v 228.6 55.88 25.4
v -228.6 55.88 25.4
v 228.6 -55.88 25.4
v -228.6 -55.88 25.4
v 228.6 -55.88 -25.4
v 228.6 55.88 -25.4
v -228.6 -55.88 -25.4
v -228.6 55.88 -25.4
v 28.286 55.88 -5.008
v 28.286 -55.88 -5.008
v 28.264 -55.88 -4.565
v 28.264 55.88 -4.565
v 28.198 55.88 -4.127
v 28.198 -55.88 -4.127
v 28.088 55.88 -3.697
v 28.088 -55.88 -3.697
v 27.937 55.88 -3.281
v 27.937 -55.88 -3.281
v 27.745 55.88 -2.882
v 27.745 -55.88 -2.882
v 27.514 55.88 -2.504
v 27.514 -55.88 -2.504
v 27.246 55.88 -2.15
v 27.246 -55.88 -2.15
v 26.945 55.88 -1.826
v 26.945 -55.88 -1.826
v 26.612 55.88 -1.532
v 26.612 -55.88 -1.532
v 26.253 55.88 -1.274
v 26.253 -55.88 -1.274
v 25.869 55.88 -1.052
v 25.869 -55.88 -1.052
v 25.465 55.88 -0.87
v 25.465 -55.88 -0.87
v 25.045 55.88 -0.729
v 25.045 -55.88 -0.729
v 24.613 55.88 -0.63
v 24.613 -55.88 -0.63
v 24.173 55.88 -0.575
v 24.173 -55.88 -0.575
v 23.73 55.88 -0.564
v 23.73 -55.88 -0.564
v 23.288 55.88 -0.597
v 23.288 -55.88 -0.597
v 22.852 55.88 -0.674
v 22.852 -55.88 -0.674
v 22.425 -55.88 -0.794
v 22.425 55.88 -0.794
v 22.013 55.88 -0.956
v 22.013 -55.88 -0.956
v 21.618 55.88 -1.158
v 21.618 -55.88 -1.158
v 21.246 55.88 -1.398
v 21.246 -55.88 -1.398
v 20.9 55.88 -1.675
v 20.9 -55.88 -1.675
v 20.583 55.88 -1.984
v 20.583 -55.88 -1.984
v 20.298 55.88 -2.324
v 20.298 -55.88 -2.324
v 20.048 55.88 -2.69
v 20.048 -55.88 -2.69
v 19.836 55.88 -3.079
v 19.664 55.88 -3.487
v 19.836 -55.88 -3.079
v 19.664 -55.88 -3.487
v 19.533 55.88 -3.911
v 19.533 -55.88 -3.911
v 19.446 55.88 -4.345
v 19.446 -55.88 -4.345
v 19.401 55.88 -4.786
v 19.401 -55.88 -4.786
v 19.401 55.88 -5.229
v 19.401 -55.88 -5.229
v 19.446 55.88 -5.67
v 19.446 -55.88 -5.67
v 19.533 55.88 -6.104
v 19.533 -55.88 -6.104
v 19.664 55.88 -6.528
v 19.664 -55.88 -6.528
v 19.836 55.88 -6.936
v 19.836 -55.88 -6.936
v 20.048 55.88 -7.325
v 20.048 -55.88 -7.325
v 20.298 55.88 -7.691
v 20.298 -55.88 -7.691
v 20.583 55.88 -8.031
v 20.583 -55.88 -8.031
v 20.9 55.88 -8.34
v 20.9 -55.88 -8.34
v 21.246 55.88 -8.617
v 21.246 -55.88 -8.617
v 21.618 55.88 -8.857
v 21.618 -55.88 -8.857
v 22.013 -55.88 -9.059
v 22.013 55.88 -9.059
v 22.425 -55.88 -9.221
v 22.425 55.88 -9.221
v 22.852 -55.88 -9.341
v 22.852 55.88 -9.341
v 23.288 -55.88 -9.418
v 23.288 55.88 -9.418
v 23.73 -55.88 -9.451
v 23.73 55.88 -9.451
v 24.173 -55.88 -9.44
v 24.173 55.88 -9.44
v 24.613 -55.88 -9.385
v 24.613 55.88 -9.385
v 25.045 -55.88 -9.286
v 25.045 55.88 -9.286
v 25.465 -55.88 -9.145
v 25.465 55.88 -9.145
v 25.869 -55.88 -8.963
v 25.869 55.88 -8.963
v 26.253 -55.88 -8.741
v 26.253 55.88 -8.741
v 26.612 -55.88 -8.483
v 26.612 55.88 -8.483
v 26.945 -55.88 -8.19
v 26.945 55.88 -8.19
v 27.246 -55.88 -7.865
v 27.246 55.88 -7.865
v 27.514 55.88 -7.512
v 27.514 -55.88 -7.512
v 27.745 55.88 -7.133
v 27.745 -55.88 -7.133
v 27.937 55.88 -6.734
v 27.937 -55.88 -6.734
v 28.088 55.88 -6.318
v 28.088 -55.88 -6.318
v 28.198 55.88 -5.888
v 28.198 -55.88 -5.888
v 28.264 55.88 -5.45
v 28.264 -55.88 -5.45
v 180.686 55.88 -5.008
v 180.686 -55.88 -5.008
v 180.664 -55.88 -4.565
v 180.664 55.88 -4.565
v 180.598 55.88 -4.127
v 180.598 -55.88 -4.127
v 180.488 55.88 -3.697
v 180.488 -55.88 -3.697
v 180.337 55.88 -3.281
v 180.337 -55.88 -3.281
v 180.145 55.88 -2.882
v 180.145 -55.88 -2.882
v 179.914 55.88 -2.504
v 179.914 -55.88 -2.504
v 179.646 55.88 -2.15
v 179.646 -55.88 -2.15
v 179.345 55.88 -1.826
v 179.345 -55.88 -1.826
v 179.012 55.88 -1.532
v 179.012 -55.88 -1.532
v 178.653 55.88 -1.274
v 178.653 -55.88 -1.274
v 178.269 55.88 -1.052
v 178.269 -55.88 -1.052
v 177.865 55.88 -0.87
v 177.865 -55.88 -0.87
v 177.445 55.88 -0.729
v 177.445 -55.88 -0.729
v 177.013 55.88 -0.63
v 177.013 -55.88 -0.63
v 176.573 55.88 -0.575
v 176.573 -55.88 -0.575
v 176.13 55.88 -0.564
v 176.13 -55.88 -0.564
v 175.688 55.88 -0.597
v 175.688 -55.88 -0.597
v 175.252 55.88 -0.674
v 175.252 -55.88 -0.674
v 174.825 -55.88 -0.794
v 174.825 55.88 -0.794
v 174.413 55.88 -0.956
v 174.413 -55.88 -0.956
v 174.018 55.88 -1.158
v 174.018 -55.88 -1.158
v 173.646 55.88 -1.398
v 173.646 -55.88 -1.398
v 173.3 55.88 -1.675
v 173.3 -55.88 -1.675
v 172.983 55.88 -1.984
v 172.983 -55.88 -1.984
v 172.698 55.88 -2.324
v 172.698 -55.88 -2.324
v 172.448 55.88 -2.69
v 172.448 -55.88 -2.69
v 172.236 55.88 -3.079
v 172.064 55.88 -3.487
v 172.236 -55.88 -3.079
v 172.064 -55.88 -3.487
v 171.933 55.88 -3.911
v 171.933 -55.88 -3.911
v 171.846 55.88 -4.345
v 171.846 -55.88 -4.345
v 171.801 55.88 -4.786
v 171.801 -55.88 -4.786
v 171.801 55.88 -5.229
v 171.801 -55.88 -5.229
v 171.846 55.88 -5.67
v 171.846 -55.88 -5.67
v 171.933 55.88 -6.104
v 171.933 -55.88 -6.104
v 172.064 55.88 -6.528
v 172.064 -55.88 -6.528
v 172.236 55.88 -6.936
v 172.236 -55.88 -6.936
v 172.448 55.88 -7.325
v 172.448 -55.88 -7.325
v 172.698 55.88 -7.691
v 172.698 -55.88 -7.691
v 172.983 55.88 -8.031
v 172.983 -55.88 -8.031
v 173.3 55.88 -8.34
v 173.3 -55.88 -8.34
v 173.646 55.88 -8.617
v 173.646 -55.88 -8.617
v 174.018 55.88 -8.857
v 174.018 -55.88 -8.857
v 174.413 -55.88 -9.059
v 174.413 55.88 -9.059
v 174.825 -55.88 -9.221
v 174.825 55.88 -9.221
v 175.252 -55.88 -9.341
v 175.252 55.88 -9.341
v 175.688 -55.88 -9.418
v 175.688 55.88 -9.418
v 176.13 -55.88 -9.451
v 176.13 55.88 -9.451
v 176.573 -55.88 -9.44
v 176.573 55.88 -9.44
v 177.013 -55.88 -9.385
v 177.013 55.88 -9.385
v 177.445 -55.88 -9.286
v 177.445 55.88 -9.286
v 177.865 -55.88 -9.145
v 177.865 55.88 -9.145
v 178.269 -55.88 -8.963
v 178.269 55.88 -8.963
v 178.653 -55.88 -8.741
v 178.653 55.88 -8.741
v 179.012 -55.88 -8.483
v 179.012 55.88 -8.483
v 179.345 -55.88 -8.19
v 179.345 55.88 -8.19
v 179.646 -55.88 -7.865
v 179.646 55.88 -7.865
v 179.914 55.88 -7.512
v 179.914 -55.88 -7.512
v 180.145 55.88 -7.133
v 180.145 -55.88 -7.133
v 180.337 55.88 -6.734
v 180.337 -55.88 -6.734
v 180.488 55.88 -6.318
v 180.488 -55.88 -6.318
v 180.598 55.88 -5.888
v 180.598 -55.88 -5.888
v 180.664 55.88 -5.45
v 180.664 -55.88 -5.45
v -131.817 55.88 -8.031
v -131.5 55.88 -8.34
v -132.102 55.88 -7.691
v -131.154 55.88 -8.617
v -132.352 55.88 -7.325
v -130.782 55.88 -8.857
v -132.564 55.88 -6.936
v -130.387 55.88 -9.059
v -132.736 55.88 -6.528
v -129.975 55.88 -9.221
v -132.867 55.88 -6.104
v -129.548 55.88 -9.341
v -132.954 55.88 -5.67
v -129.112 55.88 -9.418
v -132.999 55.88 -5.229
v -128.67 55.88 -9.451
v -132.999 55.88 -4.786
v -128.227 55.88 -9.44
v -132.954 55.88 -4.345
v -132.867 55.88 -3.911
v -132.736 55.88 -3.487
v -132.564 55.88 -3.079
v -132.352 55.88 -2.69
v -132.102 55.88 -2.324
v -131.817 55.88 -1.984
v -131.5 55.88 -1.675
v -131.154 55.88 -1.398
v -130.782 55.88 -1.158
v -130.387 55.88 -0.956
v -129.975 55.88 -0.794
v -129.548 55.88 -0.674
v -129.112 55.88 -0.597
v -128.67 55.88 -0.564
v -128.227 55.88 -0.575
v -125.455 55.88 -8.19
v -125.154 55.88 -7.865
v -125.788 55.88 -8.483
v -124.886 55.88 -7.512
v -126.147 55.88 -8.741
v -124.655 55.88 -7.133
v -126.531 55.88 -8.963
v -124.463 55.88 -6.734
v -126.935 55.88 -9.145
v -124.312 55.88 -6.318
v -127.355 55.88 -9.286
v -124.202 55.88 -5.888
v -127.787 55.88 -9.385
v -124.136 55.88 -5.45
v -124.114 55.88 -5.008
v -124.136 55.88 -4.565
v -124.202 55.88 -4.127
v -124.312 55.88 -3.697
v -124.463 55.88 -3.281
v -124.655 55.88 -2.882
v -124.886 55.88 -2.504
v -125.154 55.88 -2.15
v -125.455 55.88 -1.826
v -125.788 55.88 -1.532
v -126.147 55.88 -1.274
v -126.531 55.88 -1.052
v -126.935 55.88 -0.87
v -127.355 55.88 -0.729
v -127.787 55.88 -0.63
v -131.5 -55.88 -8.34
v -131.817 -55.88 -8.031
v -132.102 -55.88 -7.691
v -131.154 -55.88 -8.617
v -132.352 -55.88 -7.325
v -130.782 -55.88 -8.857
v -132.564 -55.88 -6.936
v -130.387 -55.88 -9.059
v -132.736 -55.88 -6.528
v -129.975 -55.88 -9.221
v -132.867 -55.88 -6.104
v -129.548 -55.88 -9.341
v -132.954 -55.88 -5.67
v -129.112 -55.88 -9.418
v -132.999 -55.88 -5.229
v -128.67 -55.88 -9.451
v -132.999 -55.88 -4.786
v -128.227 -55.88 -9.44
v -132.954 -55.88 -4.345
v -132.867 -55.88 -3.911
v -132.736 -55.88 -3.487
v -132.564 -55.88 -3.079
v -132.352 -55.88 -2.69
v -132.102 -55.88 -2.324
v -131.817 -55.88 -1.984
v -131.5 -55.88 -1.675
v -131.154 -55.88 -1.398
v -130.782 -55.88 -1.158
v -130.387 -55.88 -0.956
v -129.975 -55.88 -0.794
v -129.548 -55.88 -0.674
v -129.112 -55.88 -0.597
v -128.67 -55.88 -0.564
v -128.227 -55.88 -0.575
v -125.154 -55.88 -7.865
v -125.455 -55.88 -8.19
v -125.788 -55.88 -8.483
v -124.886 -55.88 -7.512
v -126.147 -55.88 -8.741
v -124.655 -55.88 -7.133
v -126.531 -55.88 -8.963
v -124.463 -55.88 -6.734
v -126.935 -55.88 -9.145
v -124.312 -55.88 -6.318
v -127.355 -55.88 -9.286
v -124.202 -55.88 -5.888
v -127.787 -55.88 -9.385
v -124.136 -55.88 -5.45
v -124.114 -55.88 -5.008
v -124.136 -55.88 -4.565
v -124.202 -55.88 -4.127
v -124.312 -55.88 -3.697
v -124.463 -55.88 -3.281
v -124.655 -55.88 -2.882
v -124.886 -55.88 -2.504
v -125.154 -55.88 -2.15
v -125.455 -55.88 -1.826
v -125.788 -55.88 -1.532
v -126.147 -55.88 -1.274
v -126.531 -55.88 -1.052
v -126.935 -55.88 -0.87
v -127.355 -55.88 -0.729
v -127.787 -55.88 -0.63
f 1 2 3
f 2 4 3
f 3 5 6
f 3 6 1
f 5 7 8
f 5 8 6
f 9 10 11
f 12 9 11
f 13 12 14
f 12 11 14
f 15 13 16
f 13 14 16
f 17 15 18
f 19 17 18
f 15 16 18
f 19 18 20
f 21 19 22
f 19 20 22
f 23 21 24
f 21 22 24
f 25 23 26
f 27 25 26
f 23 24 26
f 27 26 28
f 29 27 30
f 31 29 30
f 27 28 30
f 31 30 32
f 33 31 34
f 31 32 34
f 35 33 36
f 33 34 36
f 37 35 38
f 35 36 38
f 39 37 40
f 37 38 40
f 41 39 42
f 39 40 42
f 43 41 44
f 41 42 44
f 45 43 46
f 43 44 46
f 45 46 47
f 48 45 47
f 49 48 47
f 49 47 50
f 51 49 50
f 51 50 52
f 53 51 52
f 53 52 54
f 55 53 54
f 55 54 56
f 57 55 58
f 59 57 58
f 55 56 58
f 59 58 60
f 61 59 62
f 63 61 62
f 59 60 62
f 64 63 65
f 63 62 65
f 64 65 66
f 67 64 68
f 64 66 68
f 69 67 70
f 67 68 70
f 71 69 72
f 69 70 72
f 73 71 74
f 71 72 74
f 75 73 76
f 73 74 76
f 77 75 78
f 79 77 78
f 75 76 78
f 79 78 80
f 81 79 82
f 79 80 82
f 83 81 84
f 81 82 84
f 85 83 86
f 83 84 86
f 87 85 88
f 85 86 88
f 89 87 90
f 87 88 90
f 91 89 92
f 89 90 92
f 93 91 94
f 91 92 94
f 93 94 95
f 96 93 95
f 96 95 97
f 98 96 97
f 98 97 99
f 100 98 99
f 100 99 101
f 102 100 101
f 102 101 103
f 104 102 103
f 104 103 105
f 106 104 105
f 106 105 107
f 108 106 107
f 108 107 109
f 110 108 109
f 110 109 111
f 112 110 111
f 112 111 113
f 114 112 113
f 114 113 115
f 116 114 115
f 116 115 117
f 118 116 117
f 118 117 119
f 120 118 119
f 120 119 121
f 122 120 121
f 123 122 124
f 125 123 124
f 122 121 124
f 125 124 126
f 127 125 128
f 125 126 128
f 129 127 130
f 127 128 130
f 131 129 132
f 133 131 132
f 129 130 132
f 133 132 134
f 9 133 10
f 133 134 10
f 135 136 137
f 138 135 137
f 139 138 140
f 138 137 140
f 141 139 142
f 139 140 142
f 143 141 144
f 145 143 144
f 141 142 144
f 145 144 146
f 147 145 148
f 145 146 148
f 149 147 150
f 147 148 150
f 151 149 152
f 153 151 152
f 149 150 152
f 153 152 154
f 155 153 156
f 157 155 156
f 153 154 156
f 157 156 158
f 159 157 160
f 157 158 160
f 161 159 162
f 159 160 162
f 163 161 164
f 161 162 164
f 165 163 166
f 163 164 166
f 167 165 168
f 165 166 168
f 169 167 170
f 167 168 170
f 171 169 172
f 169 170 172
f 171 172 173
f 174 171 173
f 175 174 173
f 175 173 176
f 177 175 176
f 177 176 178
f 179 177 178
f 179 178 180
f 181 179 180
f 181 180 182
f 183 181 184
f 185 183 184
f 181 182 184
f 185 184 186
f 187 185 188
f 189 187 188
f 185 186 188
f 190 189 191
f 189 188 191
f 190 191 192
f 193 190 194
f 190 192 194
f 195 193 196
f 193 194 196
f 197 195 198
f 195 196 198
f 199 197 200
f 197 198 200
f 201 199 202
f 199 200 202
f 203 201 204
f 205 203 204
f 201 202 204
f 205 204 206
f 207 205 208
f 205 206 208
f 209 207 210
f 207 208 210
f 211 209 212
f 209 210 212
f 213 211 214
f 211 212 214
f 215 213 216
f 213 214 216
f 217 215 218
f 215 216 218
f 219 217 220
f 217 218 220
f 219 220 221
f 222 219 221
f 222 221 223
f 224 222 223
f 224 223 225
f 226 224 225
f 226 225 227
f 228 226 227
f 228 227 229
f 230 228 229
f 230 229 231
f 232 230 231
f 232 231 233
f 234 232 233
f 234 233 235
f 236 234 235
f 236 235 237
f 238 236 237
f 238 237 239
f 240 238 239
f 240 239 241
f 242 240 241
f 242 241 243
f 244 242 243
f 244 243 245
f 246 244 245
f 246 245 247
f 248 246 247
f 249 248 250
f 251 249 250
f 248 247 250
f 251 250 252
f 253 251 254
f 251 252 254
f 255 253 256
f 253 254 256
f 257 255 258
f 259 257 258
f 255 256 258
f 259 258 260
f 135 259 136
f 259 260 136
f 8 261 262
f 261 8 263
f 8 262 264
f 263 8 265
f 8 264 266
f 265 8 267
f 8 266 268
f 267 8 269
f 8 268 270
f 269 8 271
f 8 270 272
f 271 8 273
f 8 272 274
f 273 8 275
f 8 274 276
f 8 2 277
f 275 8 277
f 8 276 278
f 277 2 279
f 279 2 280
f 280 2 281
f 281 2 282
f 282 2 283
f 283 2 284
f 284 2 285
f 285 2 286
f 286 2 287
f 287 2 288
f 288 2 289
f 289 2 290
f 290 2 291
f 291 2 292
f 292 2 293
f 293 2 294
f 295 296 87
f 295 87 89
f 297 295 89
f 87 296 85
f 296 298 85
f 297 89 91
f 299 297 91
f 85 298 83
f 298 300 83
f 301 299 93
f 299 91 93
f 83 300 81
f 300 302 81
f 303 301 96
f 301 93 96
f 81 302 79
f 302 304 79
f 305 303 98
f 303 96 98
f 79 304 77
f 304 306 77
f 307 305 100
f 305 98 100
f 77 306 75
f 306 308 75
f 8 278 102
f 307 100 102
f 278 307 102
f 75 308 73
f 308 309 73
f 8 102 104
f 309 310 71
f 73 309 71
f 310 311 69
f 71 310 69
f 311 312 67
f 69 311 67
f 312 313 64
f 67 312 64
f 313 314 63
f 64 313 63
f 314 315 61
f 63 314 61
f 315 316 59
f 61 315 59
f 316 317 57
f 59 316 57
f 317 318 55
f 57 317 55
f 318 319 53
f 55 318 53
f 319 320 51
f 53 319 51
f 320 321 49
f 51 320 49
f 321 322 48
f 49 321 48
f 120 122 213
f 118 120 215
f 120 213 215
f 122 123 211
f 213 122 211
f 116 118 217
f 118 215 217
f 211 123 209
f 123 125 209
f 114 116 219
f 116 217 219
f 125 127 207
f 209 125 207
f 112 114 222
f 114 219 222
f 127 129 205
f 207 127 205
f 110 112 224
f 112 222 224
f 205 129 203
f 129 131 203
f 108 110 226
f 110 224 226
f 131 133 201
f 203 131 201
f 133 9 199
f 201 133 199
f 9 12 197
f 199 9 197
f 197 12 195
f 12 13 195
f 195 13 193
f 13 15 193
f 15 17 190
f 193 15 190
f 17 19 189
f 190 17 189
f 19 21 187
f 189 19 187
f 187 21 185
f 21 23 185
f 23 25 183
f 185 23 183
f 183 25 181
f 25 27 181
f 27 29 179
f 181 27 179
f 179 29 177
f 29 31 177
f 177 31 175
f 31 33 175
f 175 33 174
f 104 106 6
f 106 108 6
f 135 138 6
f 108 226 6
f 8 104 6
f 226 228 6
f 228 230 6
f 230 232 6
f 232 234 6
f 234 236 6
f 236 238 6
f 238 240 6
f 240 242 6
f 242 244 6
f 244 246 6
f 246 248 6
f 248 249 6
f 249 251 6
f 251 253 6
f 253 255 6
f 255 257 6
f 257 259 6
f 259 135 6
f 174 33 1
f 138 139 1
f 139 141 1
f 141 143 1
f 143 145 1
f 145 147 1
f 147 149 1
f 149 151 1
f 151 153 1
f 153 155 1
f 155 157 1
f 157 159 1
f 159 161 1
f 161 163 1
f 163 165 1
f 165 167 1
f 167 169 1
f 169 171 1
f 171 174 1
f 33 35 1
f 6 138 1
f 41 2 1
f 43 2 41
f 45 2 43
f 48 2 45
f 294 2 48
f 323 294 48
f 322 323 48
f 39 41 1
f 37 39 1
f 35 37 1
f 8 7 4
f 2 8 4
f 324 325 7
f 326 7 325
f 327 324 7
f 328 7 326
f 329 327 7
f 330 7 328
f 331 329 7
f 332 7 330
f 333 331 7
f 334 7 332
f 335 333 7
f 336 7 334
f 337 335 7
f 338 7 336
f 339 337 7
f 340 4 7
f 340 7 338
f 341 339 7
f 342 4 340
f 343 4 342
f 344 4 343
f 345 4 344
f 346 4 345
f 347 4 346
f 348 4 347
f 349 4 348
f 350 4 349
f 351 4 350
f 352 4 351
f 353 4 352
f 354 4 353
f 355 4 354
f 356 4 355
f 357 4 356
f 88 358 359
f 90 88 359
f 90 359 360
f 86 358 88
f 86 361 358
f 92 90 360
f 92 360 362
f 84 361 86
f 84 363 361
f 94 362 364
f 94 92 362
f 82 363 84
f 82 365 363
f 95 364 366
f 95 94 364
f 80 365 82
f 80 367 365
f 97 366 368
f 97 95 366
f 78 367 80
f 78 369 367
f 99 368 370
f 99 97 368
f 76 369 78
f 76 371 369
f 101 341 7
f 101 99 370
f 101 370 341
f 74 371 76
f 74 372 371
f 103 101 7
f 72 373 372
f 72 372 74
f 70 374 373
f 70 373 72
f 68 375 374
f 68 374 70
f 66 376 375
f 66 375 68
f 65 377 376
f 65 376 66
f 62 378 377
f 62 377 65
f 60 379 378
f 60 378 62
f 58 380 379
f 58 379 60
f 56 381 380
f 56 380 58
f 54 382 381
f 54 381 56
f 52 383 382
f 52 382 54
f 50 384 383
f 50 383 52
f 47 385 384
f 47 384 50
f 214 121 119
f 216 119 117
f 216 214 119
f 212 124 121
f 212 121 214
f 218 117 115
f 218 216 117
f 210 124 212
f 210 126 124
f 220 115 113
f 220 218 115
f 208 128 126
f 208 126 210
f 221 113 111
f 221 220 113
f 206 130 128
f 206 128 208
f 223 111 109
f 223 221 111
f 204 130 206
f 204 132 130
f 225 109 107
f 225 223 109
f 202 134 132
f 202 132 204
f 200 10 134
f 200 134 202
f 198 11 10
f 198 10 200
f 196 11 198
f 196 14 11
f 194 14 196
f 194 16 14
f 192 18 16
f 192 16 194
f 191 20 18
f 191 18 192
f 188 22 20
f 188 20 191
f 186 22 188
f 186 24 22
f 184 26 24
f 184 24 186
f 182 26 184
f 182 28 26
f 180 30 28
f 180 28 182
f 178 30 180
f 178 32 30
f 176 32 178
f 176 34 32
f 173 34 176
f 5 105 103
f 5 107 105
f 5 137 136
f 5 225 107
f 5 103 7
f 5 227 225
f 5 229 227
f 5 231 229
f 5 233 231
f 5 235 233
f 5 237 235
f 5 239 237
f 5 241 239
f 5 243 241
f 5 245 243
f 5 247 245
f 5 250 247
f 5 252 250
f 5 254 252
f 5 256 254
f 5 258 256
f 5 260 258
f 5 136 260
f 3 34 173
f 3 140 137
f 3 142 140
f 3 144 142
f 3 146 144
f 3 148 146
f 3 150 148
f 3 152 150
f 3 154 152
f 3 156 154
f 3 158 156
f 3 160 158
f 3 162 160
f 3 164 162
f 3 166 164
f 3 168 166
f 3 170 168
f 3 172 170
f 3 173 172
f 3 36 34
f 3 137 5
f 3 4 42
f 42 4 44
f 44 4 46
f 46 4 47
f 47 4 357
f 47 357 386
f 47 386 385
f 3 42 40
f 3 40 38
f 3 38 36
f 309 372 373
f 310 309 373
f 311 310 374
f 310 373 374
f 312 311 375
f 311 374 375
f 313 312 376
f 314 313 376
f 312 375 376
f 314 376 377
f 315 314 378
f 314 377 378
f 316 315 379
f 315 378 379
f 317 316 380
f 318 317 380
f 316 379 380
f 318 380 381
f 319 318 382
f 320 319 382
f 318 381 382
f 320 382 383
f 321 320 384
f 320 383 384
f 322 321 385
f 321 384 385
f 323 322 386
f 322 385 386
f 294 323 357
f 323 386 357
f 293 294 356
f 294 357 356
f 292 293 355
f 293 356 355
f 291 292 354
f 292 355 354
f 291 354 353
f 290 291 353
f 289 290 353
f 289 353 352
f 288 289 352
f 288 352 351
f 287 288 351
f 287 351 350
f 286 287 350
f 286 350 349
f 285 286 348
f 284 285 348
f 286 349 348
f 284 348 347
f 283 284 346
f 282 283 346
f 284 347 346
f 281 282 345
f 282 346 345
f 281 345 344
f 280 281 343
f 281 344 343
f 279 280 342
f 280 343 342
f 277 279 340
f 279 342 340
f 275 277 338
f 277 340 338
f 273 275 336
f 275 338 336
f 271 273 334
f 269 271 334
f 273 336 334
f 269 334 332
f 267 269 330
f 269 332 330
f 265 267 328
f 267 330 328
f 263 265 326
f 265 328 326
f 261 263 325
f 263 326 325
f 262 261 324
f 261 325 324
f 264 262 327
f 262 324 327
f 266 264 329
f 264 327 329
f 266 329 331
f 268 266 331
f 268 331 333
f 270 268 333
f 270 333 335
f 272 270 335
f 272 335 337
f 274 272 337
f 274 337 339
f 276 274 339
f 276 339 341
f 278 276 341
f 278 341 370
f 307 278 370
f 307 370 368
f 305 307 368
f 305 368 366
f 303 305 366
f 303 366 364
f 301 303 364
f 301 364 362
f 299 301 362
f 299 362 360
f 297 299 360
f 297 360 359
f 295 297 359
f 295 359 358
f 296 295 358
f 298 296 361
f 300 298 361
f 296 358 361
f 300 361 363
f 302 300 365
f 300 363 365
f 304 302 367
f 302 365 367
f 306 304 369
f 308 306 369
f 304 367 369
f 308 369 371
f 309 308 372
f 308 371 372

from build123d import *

# Parameters (mm, degrees)
F0_W     = 457.2
F0_H     = 50.8
F1_DEPTH = 55.88
F2_R     = 4.445
F3_DEPTH = 111.76


with BuildPart() as f1:
    # F0 (on Front) → F1 (new body, symmetric)
    with BuildSketch(Plane.XZ):
        Rectangle(F0_W, F0_H)
    extrude(amount=F1_DEPTH, both=True)

    # F2 (on face) → F3 (cut, through all)
    with BuildSketch(Plane.XZ.offset(55.88)):
        with Locations((-128.559027, -5.007562)):
            Circle(F2_R)
        with Locations((23.840973, -5.007562)):
            Circle(F2_R)
        with Locations((176.240973, -5.007562)):
            Circle(F2_R)
    extrude(amount=-F3_DEPTH, mode=Mode.SUBTRACT)


solid = f1.part
